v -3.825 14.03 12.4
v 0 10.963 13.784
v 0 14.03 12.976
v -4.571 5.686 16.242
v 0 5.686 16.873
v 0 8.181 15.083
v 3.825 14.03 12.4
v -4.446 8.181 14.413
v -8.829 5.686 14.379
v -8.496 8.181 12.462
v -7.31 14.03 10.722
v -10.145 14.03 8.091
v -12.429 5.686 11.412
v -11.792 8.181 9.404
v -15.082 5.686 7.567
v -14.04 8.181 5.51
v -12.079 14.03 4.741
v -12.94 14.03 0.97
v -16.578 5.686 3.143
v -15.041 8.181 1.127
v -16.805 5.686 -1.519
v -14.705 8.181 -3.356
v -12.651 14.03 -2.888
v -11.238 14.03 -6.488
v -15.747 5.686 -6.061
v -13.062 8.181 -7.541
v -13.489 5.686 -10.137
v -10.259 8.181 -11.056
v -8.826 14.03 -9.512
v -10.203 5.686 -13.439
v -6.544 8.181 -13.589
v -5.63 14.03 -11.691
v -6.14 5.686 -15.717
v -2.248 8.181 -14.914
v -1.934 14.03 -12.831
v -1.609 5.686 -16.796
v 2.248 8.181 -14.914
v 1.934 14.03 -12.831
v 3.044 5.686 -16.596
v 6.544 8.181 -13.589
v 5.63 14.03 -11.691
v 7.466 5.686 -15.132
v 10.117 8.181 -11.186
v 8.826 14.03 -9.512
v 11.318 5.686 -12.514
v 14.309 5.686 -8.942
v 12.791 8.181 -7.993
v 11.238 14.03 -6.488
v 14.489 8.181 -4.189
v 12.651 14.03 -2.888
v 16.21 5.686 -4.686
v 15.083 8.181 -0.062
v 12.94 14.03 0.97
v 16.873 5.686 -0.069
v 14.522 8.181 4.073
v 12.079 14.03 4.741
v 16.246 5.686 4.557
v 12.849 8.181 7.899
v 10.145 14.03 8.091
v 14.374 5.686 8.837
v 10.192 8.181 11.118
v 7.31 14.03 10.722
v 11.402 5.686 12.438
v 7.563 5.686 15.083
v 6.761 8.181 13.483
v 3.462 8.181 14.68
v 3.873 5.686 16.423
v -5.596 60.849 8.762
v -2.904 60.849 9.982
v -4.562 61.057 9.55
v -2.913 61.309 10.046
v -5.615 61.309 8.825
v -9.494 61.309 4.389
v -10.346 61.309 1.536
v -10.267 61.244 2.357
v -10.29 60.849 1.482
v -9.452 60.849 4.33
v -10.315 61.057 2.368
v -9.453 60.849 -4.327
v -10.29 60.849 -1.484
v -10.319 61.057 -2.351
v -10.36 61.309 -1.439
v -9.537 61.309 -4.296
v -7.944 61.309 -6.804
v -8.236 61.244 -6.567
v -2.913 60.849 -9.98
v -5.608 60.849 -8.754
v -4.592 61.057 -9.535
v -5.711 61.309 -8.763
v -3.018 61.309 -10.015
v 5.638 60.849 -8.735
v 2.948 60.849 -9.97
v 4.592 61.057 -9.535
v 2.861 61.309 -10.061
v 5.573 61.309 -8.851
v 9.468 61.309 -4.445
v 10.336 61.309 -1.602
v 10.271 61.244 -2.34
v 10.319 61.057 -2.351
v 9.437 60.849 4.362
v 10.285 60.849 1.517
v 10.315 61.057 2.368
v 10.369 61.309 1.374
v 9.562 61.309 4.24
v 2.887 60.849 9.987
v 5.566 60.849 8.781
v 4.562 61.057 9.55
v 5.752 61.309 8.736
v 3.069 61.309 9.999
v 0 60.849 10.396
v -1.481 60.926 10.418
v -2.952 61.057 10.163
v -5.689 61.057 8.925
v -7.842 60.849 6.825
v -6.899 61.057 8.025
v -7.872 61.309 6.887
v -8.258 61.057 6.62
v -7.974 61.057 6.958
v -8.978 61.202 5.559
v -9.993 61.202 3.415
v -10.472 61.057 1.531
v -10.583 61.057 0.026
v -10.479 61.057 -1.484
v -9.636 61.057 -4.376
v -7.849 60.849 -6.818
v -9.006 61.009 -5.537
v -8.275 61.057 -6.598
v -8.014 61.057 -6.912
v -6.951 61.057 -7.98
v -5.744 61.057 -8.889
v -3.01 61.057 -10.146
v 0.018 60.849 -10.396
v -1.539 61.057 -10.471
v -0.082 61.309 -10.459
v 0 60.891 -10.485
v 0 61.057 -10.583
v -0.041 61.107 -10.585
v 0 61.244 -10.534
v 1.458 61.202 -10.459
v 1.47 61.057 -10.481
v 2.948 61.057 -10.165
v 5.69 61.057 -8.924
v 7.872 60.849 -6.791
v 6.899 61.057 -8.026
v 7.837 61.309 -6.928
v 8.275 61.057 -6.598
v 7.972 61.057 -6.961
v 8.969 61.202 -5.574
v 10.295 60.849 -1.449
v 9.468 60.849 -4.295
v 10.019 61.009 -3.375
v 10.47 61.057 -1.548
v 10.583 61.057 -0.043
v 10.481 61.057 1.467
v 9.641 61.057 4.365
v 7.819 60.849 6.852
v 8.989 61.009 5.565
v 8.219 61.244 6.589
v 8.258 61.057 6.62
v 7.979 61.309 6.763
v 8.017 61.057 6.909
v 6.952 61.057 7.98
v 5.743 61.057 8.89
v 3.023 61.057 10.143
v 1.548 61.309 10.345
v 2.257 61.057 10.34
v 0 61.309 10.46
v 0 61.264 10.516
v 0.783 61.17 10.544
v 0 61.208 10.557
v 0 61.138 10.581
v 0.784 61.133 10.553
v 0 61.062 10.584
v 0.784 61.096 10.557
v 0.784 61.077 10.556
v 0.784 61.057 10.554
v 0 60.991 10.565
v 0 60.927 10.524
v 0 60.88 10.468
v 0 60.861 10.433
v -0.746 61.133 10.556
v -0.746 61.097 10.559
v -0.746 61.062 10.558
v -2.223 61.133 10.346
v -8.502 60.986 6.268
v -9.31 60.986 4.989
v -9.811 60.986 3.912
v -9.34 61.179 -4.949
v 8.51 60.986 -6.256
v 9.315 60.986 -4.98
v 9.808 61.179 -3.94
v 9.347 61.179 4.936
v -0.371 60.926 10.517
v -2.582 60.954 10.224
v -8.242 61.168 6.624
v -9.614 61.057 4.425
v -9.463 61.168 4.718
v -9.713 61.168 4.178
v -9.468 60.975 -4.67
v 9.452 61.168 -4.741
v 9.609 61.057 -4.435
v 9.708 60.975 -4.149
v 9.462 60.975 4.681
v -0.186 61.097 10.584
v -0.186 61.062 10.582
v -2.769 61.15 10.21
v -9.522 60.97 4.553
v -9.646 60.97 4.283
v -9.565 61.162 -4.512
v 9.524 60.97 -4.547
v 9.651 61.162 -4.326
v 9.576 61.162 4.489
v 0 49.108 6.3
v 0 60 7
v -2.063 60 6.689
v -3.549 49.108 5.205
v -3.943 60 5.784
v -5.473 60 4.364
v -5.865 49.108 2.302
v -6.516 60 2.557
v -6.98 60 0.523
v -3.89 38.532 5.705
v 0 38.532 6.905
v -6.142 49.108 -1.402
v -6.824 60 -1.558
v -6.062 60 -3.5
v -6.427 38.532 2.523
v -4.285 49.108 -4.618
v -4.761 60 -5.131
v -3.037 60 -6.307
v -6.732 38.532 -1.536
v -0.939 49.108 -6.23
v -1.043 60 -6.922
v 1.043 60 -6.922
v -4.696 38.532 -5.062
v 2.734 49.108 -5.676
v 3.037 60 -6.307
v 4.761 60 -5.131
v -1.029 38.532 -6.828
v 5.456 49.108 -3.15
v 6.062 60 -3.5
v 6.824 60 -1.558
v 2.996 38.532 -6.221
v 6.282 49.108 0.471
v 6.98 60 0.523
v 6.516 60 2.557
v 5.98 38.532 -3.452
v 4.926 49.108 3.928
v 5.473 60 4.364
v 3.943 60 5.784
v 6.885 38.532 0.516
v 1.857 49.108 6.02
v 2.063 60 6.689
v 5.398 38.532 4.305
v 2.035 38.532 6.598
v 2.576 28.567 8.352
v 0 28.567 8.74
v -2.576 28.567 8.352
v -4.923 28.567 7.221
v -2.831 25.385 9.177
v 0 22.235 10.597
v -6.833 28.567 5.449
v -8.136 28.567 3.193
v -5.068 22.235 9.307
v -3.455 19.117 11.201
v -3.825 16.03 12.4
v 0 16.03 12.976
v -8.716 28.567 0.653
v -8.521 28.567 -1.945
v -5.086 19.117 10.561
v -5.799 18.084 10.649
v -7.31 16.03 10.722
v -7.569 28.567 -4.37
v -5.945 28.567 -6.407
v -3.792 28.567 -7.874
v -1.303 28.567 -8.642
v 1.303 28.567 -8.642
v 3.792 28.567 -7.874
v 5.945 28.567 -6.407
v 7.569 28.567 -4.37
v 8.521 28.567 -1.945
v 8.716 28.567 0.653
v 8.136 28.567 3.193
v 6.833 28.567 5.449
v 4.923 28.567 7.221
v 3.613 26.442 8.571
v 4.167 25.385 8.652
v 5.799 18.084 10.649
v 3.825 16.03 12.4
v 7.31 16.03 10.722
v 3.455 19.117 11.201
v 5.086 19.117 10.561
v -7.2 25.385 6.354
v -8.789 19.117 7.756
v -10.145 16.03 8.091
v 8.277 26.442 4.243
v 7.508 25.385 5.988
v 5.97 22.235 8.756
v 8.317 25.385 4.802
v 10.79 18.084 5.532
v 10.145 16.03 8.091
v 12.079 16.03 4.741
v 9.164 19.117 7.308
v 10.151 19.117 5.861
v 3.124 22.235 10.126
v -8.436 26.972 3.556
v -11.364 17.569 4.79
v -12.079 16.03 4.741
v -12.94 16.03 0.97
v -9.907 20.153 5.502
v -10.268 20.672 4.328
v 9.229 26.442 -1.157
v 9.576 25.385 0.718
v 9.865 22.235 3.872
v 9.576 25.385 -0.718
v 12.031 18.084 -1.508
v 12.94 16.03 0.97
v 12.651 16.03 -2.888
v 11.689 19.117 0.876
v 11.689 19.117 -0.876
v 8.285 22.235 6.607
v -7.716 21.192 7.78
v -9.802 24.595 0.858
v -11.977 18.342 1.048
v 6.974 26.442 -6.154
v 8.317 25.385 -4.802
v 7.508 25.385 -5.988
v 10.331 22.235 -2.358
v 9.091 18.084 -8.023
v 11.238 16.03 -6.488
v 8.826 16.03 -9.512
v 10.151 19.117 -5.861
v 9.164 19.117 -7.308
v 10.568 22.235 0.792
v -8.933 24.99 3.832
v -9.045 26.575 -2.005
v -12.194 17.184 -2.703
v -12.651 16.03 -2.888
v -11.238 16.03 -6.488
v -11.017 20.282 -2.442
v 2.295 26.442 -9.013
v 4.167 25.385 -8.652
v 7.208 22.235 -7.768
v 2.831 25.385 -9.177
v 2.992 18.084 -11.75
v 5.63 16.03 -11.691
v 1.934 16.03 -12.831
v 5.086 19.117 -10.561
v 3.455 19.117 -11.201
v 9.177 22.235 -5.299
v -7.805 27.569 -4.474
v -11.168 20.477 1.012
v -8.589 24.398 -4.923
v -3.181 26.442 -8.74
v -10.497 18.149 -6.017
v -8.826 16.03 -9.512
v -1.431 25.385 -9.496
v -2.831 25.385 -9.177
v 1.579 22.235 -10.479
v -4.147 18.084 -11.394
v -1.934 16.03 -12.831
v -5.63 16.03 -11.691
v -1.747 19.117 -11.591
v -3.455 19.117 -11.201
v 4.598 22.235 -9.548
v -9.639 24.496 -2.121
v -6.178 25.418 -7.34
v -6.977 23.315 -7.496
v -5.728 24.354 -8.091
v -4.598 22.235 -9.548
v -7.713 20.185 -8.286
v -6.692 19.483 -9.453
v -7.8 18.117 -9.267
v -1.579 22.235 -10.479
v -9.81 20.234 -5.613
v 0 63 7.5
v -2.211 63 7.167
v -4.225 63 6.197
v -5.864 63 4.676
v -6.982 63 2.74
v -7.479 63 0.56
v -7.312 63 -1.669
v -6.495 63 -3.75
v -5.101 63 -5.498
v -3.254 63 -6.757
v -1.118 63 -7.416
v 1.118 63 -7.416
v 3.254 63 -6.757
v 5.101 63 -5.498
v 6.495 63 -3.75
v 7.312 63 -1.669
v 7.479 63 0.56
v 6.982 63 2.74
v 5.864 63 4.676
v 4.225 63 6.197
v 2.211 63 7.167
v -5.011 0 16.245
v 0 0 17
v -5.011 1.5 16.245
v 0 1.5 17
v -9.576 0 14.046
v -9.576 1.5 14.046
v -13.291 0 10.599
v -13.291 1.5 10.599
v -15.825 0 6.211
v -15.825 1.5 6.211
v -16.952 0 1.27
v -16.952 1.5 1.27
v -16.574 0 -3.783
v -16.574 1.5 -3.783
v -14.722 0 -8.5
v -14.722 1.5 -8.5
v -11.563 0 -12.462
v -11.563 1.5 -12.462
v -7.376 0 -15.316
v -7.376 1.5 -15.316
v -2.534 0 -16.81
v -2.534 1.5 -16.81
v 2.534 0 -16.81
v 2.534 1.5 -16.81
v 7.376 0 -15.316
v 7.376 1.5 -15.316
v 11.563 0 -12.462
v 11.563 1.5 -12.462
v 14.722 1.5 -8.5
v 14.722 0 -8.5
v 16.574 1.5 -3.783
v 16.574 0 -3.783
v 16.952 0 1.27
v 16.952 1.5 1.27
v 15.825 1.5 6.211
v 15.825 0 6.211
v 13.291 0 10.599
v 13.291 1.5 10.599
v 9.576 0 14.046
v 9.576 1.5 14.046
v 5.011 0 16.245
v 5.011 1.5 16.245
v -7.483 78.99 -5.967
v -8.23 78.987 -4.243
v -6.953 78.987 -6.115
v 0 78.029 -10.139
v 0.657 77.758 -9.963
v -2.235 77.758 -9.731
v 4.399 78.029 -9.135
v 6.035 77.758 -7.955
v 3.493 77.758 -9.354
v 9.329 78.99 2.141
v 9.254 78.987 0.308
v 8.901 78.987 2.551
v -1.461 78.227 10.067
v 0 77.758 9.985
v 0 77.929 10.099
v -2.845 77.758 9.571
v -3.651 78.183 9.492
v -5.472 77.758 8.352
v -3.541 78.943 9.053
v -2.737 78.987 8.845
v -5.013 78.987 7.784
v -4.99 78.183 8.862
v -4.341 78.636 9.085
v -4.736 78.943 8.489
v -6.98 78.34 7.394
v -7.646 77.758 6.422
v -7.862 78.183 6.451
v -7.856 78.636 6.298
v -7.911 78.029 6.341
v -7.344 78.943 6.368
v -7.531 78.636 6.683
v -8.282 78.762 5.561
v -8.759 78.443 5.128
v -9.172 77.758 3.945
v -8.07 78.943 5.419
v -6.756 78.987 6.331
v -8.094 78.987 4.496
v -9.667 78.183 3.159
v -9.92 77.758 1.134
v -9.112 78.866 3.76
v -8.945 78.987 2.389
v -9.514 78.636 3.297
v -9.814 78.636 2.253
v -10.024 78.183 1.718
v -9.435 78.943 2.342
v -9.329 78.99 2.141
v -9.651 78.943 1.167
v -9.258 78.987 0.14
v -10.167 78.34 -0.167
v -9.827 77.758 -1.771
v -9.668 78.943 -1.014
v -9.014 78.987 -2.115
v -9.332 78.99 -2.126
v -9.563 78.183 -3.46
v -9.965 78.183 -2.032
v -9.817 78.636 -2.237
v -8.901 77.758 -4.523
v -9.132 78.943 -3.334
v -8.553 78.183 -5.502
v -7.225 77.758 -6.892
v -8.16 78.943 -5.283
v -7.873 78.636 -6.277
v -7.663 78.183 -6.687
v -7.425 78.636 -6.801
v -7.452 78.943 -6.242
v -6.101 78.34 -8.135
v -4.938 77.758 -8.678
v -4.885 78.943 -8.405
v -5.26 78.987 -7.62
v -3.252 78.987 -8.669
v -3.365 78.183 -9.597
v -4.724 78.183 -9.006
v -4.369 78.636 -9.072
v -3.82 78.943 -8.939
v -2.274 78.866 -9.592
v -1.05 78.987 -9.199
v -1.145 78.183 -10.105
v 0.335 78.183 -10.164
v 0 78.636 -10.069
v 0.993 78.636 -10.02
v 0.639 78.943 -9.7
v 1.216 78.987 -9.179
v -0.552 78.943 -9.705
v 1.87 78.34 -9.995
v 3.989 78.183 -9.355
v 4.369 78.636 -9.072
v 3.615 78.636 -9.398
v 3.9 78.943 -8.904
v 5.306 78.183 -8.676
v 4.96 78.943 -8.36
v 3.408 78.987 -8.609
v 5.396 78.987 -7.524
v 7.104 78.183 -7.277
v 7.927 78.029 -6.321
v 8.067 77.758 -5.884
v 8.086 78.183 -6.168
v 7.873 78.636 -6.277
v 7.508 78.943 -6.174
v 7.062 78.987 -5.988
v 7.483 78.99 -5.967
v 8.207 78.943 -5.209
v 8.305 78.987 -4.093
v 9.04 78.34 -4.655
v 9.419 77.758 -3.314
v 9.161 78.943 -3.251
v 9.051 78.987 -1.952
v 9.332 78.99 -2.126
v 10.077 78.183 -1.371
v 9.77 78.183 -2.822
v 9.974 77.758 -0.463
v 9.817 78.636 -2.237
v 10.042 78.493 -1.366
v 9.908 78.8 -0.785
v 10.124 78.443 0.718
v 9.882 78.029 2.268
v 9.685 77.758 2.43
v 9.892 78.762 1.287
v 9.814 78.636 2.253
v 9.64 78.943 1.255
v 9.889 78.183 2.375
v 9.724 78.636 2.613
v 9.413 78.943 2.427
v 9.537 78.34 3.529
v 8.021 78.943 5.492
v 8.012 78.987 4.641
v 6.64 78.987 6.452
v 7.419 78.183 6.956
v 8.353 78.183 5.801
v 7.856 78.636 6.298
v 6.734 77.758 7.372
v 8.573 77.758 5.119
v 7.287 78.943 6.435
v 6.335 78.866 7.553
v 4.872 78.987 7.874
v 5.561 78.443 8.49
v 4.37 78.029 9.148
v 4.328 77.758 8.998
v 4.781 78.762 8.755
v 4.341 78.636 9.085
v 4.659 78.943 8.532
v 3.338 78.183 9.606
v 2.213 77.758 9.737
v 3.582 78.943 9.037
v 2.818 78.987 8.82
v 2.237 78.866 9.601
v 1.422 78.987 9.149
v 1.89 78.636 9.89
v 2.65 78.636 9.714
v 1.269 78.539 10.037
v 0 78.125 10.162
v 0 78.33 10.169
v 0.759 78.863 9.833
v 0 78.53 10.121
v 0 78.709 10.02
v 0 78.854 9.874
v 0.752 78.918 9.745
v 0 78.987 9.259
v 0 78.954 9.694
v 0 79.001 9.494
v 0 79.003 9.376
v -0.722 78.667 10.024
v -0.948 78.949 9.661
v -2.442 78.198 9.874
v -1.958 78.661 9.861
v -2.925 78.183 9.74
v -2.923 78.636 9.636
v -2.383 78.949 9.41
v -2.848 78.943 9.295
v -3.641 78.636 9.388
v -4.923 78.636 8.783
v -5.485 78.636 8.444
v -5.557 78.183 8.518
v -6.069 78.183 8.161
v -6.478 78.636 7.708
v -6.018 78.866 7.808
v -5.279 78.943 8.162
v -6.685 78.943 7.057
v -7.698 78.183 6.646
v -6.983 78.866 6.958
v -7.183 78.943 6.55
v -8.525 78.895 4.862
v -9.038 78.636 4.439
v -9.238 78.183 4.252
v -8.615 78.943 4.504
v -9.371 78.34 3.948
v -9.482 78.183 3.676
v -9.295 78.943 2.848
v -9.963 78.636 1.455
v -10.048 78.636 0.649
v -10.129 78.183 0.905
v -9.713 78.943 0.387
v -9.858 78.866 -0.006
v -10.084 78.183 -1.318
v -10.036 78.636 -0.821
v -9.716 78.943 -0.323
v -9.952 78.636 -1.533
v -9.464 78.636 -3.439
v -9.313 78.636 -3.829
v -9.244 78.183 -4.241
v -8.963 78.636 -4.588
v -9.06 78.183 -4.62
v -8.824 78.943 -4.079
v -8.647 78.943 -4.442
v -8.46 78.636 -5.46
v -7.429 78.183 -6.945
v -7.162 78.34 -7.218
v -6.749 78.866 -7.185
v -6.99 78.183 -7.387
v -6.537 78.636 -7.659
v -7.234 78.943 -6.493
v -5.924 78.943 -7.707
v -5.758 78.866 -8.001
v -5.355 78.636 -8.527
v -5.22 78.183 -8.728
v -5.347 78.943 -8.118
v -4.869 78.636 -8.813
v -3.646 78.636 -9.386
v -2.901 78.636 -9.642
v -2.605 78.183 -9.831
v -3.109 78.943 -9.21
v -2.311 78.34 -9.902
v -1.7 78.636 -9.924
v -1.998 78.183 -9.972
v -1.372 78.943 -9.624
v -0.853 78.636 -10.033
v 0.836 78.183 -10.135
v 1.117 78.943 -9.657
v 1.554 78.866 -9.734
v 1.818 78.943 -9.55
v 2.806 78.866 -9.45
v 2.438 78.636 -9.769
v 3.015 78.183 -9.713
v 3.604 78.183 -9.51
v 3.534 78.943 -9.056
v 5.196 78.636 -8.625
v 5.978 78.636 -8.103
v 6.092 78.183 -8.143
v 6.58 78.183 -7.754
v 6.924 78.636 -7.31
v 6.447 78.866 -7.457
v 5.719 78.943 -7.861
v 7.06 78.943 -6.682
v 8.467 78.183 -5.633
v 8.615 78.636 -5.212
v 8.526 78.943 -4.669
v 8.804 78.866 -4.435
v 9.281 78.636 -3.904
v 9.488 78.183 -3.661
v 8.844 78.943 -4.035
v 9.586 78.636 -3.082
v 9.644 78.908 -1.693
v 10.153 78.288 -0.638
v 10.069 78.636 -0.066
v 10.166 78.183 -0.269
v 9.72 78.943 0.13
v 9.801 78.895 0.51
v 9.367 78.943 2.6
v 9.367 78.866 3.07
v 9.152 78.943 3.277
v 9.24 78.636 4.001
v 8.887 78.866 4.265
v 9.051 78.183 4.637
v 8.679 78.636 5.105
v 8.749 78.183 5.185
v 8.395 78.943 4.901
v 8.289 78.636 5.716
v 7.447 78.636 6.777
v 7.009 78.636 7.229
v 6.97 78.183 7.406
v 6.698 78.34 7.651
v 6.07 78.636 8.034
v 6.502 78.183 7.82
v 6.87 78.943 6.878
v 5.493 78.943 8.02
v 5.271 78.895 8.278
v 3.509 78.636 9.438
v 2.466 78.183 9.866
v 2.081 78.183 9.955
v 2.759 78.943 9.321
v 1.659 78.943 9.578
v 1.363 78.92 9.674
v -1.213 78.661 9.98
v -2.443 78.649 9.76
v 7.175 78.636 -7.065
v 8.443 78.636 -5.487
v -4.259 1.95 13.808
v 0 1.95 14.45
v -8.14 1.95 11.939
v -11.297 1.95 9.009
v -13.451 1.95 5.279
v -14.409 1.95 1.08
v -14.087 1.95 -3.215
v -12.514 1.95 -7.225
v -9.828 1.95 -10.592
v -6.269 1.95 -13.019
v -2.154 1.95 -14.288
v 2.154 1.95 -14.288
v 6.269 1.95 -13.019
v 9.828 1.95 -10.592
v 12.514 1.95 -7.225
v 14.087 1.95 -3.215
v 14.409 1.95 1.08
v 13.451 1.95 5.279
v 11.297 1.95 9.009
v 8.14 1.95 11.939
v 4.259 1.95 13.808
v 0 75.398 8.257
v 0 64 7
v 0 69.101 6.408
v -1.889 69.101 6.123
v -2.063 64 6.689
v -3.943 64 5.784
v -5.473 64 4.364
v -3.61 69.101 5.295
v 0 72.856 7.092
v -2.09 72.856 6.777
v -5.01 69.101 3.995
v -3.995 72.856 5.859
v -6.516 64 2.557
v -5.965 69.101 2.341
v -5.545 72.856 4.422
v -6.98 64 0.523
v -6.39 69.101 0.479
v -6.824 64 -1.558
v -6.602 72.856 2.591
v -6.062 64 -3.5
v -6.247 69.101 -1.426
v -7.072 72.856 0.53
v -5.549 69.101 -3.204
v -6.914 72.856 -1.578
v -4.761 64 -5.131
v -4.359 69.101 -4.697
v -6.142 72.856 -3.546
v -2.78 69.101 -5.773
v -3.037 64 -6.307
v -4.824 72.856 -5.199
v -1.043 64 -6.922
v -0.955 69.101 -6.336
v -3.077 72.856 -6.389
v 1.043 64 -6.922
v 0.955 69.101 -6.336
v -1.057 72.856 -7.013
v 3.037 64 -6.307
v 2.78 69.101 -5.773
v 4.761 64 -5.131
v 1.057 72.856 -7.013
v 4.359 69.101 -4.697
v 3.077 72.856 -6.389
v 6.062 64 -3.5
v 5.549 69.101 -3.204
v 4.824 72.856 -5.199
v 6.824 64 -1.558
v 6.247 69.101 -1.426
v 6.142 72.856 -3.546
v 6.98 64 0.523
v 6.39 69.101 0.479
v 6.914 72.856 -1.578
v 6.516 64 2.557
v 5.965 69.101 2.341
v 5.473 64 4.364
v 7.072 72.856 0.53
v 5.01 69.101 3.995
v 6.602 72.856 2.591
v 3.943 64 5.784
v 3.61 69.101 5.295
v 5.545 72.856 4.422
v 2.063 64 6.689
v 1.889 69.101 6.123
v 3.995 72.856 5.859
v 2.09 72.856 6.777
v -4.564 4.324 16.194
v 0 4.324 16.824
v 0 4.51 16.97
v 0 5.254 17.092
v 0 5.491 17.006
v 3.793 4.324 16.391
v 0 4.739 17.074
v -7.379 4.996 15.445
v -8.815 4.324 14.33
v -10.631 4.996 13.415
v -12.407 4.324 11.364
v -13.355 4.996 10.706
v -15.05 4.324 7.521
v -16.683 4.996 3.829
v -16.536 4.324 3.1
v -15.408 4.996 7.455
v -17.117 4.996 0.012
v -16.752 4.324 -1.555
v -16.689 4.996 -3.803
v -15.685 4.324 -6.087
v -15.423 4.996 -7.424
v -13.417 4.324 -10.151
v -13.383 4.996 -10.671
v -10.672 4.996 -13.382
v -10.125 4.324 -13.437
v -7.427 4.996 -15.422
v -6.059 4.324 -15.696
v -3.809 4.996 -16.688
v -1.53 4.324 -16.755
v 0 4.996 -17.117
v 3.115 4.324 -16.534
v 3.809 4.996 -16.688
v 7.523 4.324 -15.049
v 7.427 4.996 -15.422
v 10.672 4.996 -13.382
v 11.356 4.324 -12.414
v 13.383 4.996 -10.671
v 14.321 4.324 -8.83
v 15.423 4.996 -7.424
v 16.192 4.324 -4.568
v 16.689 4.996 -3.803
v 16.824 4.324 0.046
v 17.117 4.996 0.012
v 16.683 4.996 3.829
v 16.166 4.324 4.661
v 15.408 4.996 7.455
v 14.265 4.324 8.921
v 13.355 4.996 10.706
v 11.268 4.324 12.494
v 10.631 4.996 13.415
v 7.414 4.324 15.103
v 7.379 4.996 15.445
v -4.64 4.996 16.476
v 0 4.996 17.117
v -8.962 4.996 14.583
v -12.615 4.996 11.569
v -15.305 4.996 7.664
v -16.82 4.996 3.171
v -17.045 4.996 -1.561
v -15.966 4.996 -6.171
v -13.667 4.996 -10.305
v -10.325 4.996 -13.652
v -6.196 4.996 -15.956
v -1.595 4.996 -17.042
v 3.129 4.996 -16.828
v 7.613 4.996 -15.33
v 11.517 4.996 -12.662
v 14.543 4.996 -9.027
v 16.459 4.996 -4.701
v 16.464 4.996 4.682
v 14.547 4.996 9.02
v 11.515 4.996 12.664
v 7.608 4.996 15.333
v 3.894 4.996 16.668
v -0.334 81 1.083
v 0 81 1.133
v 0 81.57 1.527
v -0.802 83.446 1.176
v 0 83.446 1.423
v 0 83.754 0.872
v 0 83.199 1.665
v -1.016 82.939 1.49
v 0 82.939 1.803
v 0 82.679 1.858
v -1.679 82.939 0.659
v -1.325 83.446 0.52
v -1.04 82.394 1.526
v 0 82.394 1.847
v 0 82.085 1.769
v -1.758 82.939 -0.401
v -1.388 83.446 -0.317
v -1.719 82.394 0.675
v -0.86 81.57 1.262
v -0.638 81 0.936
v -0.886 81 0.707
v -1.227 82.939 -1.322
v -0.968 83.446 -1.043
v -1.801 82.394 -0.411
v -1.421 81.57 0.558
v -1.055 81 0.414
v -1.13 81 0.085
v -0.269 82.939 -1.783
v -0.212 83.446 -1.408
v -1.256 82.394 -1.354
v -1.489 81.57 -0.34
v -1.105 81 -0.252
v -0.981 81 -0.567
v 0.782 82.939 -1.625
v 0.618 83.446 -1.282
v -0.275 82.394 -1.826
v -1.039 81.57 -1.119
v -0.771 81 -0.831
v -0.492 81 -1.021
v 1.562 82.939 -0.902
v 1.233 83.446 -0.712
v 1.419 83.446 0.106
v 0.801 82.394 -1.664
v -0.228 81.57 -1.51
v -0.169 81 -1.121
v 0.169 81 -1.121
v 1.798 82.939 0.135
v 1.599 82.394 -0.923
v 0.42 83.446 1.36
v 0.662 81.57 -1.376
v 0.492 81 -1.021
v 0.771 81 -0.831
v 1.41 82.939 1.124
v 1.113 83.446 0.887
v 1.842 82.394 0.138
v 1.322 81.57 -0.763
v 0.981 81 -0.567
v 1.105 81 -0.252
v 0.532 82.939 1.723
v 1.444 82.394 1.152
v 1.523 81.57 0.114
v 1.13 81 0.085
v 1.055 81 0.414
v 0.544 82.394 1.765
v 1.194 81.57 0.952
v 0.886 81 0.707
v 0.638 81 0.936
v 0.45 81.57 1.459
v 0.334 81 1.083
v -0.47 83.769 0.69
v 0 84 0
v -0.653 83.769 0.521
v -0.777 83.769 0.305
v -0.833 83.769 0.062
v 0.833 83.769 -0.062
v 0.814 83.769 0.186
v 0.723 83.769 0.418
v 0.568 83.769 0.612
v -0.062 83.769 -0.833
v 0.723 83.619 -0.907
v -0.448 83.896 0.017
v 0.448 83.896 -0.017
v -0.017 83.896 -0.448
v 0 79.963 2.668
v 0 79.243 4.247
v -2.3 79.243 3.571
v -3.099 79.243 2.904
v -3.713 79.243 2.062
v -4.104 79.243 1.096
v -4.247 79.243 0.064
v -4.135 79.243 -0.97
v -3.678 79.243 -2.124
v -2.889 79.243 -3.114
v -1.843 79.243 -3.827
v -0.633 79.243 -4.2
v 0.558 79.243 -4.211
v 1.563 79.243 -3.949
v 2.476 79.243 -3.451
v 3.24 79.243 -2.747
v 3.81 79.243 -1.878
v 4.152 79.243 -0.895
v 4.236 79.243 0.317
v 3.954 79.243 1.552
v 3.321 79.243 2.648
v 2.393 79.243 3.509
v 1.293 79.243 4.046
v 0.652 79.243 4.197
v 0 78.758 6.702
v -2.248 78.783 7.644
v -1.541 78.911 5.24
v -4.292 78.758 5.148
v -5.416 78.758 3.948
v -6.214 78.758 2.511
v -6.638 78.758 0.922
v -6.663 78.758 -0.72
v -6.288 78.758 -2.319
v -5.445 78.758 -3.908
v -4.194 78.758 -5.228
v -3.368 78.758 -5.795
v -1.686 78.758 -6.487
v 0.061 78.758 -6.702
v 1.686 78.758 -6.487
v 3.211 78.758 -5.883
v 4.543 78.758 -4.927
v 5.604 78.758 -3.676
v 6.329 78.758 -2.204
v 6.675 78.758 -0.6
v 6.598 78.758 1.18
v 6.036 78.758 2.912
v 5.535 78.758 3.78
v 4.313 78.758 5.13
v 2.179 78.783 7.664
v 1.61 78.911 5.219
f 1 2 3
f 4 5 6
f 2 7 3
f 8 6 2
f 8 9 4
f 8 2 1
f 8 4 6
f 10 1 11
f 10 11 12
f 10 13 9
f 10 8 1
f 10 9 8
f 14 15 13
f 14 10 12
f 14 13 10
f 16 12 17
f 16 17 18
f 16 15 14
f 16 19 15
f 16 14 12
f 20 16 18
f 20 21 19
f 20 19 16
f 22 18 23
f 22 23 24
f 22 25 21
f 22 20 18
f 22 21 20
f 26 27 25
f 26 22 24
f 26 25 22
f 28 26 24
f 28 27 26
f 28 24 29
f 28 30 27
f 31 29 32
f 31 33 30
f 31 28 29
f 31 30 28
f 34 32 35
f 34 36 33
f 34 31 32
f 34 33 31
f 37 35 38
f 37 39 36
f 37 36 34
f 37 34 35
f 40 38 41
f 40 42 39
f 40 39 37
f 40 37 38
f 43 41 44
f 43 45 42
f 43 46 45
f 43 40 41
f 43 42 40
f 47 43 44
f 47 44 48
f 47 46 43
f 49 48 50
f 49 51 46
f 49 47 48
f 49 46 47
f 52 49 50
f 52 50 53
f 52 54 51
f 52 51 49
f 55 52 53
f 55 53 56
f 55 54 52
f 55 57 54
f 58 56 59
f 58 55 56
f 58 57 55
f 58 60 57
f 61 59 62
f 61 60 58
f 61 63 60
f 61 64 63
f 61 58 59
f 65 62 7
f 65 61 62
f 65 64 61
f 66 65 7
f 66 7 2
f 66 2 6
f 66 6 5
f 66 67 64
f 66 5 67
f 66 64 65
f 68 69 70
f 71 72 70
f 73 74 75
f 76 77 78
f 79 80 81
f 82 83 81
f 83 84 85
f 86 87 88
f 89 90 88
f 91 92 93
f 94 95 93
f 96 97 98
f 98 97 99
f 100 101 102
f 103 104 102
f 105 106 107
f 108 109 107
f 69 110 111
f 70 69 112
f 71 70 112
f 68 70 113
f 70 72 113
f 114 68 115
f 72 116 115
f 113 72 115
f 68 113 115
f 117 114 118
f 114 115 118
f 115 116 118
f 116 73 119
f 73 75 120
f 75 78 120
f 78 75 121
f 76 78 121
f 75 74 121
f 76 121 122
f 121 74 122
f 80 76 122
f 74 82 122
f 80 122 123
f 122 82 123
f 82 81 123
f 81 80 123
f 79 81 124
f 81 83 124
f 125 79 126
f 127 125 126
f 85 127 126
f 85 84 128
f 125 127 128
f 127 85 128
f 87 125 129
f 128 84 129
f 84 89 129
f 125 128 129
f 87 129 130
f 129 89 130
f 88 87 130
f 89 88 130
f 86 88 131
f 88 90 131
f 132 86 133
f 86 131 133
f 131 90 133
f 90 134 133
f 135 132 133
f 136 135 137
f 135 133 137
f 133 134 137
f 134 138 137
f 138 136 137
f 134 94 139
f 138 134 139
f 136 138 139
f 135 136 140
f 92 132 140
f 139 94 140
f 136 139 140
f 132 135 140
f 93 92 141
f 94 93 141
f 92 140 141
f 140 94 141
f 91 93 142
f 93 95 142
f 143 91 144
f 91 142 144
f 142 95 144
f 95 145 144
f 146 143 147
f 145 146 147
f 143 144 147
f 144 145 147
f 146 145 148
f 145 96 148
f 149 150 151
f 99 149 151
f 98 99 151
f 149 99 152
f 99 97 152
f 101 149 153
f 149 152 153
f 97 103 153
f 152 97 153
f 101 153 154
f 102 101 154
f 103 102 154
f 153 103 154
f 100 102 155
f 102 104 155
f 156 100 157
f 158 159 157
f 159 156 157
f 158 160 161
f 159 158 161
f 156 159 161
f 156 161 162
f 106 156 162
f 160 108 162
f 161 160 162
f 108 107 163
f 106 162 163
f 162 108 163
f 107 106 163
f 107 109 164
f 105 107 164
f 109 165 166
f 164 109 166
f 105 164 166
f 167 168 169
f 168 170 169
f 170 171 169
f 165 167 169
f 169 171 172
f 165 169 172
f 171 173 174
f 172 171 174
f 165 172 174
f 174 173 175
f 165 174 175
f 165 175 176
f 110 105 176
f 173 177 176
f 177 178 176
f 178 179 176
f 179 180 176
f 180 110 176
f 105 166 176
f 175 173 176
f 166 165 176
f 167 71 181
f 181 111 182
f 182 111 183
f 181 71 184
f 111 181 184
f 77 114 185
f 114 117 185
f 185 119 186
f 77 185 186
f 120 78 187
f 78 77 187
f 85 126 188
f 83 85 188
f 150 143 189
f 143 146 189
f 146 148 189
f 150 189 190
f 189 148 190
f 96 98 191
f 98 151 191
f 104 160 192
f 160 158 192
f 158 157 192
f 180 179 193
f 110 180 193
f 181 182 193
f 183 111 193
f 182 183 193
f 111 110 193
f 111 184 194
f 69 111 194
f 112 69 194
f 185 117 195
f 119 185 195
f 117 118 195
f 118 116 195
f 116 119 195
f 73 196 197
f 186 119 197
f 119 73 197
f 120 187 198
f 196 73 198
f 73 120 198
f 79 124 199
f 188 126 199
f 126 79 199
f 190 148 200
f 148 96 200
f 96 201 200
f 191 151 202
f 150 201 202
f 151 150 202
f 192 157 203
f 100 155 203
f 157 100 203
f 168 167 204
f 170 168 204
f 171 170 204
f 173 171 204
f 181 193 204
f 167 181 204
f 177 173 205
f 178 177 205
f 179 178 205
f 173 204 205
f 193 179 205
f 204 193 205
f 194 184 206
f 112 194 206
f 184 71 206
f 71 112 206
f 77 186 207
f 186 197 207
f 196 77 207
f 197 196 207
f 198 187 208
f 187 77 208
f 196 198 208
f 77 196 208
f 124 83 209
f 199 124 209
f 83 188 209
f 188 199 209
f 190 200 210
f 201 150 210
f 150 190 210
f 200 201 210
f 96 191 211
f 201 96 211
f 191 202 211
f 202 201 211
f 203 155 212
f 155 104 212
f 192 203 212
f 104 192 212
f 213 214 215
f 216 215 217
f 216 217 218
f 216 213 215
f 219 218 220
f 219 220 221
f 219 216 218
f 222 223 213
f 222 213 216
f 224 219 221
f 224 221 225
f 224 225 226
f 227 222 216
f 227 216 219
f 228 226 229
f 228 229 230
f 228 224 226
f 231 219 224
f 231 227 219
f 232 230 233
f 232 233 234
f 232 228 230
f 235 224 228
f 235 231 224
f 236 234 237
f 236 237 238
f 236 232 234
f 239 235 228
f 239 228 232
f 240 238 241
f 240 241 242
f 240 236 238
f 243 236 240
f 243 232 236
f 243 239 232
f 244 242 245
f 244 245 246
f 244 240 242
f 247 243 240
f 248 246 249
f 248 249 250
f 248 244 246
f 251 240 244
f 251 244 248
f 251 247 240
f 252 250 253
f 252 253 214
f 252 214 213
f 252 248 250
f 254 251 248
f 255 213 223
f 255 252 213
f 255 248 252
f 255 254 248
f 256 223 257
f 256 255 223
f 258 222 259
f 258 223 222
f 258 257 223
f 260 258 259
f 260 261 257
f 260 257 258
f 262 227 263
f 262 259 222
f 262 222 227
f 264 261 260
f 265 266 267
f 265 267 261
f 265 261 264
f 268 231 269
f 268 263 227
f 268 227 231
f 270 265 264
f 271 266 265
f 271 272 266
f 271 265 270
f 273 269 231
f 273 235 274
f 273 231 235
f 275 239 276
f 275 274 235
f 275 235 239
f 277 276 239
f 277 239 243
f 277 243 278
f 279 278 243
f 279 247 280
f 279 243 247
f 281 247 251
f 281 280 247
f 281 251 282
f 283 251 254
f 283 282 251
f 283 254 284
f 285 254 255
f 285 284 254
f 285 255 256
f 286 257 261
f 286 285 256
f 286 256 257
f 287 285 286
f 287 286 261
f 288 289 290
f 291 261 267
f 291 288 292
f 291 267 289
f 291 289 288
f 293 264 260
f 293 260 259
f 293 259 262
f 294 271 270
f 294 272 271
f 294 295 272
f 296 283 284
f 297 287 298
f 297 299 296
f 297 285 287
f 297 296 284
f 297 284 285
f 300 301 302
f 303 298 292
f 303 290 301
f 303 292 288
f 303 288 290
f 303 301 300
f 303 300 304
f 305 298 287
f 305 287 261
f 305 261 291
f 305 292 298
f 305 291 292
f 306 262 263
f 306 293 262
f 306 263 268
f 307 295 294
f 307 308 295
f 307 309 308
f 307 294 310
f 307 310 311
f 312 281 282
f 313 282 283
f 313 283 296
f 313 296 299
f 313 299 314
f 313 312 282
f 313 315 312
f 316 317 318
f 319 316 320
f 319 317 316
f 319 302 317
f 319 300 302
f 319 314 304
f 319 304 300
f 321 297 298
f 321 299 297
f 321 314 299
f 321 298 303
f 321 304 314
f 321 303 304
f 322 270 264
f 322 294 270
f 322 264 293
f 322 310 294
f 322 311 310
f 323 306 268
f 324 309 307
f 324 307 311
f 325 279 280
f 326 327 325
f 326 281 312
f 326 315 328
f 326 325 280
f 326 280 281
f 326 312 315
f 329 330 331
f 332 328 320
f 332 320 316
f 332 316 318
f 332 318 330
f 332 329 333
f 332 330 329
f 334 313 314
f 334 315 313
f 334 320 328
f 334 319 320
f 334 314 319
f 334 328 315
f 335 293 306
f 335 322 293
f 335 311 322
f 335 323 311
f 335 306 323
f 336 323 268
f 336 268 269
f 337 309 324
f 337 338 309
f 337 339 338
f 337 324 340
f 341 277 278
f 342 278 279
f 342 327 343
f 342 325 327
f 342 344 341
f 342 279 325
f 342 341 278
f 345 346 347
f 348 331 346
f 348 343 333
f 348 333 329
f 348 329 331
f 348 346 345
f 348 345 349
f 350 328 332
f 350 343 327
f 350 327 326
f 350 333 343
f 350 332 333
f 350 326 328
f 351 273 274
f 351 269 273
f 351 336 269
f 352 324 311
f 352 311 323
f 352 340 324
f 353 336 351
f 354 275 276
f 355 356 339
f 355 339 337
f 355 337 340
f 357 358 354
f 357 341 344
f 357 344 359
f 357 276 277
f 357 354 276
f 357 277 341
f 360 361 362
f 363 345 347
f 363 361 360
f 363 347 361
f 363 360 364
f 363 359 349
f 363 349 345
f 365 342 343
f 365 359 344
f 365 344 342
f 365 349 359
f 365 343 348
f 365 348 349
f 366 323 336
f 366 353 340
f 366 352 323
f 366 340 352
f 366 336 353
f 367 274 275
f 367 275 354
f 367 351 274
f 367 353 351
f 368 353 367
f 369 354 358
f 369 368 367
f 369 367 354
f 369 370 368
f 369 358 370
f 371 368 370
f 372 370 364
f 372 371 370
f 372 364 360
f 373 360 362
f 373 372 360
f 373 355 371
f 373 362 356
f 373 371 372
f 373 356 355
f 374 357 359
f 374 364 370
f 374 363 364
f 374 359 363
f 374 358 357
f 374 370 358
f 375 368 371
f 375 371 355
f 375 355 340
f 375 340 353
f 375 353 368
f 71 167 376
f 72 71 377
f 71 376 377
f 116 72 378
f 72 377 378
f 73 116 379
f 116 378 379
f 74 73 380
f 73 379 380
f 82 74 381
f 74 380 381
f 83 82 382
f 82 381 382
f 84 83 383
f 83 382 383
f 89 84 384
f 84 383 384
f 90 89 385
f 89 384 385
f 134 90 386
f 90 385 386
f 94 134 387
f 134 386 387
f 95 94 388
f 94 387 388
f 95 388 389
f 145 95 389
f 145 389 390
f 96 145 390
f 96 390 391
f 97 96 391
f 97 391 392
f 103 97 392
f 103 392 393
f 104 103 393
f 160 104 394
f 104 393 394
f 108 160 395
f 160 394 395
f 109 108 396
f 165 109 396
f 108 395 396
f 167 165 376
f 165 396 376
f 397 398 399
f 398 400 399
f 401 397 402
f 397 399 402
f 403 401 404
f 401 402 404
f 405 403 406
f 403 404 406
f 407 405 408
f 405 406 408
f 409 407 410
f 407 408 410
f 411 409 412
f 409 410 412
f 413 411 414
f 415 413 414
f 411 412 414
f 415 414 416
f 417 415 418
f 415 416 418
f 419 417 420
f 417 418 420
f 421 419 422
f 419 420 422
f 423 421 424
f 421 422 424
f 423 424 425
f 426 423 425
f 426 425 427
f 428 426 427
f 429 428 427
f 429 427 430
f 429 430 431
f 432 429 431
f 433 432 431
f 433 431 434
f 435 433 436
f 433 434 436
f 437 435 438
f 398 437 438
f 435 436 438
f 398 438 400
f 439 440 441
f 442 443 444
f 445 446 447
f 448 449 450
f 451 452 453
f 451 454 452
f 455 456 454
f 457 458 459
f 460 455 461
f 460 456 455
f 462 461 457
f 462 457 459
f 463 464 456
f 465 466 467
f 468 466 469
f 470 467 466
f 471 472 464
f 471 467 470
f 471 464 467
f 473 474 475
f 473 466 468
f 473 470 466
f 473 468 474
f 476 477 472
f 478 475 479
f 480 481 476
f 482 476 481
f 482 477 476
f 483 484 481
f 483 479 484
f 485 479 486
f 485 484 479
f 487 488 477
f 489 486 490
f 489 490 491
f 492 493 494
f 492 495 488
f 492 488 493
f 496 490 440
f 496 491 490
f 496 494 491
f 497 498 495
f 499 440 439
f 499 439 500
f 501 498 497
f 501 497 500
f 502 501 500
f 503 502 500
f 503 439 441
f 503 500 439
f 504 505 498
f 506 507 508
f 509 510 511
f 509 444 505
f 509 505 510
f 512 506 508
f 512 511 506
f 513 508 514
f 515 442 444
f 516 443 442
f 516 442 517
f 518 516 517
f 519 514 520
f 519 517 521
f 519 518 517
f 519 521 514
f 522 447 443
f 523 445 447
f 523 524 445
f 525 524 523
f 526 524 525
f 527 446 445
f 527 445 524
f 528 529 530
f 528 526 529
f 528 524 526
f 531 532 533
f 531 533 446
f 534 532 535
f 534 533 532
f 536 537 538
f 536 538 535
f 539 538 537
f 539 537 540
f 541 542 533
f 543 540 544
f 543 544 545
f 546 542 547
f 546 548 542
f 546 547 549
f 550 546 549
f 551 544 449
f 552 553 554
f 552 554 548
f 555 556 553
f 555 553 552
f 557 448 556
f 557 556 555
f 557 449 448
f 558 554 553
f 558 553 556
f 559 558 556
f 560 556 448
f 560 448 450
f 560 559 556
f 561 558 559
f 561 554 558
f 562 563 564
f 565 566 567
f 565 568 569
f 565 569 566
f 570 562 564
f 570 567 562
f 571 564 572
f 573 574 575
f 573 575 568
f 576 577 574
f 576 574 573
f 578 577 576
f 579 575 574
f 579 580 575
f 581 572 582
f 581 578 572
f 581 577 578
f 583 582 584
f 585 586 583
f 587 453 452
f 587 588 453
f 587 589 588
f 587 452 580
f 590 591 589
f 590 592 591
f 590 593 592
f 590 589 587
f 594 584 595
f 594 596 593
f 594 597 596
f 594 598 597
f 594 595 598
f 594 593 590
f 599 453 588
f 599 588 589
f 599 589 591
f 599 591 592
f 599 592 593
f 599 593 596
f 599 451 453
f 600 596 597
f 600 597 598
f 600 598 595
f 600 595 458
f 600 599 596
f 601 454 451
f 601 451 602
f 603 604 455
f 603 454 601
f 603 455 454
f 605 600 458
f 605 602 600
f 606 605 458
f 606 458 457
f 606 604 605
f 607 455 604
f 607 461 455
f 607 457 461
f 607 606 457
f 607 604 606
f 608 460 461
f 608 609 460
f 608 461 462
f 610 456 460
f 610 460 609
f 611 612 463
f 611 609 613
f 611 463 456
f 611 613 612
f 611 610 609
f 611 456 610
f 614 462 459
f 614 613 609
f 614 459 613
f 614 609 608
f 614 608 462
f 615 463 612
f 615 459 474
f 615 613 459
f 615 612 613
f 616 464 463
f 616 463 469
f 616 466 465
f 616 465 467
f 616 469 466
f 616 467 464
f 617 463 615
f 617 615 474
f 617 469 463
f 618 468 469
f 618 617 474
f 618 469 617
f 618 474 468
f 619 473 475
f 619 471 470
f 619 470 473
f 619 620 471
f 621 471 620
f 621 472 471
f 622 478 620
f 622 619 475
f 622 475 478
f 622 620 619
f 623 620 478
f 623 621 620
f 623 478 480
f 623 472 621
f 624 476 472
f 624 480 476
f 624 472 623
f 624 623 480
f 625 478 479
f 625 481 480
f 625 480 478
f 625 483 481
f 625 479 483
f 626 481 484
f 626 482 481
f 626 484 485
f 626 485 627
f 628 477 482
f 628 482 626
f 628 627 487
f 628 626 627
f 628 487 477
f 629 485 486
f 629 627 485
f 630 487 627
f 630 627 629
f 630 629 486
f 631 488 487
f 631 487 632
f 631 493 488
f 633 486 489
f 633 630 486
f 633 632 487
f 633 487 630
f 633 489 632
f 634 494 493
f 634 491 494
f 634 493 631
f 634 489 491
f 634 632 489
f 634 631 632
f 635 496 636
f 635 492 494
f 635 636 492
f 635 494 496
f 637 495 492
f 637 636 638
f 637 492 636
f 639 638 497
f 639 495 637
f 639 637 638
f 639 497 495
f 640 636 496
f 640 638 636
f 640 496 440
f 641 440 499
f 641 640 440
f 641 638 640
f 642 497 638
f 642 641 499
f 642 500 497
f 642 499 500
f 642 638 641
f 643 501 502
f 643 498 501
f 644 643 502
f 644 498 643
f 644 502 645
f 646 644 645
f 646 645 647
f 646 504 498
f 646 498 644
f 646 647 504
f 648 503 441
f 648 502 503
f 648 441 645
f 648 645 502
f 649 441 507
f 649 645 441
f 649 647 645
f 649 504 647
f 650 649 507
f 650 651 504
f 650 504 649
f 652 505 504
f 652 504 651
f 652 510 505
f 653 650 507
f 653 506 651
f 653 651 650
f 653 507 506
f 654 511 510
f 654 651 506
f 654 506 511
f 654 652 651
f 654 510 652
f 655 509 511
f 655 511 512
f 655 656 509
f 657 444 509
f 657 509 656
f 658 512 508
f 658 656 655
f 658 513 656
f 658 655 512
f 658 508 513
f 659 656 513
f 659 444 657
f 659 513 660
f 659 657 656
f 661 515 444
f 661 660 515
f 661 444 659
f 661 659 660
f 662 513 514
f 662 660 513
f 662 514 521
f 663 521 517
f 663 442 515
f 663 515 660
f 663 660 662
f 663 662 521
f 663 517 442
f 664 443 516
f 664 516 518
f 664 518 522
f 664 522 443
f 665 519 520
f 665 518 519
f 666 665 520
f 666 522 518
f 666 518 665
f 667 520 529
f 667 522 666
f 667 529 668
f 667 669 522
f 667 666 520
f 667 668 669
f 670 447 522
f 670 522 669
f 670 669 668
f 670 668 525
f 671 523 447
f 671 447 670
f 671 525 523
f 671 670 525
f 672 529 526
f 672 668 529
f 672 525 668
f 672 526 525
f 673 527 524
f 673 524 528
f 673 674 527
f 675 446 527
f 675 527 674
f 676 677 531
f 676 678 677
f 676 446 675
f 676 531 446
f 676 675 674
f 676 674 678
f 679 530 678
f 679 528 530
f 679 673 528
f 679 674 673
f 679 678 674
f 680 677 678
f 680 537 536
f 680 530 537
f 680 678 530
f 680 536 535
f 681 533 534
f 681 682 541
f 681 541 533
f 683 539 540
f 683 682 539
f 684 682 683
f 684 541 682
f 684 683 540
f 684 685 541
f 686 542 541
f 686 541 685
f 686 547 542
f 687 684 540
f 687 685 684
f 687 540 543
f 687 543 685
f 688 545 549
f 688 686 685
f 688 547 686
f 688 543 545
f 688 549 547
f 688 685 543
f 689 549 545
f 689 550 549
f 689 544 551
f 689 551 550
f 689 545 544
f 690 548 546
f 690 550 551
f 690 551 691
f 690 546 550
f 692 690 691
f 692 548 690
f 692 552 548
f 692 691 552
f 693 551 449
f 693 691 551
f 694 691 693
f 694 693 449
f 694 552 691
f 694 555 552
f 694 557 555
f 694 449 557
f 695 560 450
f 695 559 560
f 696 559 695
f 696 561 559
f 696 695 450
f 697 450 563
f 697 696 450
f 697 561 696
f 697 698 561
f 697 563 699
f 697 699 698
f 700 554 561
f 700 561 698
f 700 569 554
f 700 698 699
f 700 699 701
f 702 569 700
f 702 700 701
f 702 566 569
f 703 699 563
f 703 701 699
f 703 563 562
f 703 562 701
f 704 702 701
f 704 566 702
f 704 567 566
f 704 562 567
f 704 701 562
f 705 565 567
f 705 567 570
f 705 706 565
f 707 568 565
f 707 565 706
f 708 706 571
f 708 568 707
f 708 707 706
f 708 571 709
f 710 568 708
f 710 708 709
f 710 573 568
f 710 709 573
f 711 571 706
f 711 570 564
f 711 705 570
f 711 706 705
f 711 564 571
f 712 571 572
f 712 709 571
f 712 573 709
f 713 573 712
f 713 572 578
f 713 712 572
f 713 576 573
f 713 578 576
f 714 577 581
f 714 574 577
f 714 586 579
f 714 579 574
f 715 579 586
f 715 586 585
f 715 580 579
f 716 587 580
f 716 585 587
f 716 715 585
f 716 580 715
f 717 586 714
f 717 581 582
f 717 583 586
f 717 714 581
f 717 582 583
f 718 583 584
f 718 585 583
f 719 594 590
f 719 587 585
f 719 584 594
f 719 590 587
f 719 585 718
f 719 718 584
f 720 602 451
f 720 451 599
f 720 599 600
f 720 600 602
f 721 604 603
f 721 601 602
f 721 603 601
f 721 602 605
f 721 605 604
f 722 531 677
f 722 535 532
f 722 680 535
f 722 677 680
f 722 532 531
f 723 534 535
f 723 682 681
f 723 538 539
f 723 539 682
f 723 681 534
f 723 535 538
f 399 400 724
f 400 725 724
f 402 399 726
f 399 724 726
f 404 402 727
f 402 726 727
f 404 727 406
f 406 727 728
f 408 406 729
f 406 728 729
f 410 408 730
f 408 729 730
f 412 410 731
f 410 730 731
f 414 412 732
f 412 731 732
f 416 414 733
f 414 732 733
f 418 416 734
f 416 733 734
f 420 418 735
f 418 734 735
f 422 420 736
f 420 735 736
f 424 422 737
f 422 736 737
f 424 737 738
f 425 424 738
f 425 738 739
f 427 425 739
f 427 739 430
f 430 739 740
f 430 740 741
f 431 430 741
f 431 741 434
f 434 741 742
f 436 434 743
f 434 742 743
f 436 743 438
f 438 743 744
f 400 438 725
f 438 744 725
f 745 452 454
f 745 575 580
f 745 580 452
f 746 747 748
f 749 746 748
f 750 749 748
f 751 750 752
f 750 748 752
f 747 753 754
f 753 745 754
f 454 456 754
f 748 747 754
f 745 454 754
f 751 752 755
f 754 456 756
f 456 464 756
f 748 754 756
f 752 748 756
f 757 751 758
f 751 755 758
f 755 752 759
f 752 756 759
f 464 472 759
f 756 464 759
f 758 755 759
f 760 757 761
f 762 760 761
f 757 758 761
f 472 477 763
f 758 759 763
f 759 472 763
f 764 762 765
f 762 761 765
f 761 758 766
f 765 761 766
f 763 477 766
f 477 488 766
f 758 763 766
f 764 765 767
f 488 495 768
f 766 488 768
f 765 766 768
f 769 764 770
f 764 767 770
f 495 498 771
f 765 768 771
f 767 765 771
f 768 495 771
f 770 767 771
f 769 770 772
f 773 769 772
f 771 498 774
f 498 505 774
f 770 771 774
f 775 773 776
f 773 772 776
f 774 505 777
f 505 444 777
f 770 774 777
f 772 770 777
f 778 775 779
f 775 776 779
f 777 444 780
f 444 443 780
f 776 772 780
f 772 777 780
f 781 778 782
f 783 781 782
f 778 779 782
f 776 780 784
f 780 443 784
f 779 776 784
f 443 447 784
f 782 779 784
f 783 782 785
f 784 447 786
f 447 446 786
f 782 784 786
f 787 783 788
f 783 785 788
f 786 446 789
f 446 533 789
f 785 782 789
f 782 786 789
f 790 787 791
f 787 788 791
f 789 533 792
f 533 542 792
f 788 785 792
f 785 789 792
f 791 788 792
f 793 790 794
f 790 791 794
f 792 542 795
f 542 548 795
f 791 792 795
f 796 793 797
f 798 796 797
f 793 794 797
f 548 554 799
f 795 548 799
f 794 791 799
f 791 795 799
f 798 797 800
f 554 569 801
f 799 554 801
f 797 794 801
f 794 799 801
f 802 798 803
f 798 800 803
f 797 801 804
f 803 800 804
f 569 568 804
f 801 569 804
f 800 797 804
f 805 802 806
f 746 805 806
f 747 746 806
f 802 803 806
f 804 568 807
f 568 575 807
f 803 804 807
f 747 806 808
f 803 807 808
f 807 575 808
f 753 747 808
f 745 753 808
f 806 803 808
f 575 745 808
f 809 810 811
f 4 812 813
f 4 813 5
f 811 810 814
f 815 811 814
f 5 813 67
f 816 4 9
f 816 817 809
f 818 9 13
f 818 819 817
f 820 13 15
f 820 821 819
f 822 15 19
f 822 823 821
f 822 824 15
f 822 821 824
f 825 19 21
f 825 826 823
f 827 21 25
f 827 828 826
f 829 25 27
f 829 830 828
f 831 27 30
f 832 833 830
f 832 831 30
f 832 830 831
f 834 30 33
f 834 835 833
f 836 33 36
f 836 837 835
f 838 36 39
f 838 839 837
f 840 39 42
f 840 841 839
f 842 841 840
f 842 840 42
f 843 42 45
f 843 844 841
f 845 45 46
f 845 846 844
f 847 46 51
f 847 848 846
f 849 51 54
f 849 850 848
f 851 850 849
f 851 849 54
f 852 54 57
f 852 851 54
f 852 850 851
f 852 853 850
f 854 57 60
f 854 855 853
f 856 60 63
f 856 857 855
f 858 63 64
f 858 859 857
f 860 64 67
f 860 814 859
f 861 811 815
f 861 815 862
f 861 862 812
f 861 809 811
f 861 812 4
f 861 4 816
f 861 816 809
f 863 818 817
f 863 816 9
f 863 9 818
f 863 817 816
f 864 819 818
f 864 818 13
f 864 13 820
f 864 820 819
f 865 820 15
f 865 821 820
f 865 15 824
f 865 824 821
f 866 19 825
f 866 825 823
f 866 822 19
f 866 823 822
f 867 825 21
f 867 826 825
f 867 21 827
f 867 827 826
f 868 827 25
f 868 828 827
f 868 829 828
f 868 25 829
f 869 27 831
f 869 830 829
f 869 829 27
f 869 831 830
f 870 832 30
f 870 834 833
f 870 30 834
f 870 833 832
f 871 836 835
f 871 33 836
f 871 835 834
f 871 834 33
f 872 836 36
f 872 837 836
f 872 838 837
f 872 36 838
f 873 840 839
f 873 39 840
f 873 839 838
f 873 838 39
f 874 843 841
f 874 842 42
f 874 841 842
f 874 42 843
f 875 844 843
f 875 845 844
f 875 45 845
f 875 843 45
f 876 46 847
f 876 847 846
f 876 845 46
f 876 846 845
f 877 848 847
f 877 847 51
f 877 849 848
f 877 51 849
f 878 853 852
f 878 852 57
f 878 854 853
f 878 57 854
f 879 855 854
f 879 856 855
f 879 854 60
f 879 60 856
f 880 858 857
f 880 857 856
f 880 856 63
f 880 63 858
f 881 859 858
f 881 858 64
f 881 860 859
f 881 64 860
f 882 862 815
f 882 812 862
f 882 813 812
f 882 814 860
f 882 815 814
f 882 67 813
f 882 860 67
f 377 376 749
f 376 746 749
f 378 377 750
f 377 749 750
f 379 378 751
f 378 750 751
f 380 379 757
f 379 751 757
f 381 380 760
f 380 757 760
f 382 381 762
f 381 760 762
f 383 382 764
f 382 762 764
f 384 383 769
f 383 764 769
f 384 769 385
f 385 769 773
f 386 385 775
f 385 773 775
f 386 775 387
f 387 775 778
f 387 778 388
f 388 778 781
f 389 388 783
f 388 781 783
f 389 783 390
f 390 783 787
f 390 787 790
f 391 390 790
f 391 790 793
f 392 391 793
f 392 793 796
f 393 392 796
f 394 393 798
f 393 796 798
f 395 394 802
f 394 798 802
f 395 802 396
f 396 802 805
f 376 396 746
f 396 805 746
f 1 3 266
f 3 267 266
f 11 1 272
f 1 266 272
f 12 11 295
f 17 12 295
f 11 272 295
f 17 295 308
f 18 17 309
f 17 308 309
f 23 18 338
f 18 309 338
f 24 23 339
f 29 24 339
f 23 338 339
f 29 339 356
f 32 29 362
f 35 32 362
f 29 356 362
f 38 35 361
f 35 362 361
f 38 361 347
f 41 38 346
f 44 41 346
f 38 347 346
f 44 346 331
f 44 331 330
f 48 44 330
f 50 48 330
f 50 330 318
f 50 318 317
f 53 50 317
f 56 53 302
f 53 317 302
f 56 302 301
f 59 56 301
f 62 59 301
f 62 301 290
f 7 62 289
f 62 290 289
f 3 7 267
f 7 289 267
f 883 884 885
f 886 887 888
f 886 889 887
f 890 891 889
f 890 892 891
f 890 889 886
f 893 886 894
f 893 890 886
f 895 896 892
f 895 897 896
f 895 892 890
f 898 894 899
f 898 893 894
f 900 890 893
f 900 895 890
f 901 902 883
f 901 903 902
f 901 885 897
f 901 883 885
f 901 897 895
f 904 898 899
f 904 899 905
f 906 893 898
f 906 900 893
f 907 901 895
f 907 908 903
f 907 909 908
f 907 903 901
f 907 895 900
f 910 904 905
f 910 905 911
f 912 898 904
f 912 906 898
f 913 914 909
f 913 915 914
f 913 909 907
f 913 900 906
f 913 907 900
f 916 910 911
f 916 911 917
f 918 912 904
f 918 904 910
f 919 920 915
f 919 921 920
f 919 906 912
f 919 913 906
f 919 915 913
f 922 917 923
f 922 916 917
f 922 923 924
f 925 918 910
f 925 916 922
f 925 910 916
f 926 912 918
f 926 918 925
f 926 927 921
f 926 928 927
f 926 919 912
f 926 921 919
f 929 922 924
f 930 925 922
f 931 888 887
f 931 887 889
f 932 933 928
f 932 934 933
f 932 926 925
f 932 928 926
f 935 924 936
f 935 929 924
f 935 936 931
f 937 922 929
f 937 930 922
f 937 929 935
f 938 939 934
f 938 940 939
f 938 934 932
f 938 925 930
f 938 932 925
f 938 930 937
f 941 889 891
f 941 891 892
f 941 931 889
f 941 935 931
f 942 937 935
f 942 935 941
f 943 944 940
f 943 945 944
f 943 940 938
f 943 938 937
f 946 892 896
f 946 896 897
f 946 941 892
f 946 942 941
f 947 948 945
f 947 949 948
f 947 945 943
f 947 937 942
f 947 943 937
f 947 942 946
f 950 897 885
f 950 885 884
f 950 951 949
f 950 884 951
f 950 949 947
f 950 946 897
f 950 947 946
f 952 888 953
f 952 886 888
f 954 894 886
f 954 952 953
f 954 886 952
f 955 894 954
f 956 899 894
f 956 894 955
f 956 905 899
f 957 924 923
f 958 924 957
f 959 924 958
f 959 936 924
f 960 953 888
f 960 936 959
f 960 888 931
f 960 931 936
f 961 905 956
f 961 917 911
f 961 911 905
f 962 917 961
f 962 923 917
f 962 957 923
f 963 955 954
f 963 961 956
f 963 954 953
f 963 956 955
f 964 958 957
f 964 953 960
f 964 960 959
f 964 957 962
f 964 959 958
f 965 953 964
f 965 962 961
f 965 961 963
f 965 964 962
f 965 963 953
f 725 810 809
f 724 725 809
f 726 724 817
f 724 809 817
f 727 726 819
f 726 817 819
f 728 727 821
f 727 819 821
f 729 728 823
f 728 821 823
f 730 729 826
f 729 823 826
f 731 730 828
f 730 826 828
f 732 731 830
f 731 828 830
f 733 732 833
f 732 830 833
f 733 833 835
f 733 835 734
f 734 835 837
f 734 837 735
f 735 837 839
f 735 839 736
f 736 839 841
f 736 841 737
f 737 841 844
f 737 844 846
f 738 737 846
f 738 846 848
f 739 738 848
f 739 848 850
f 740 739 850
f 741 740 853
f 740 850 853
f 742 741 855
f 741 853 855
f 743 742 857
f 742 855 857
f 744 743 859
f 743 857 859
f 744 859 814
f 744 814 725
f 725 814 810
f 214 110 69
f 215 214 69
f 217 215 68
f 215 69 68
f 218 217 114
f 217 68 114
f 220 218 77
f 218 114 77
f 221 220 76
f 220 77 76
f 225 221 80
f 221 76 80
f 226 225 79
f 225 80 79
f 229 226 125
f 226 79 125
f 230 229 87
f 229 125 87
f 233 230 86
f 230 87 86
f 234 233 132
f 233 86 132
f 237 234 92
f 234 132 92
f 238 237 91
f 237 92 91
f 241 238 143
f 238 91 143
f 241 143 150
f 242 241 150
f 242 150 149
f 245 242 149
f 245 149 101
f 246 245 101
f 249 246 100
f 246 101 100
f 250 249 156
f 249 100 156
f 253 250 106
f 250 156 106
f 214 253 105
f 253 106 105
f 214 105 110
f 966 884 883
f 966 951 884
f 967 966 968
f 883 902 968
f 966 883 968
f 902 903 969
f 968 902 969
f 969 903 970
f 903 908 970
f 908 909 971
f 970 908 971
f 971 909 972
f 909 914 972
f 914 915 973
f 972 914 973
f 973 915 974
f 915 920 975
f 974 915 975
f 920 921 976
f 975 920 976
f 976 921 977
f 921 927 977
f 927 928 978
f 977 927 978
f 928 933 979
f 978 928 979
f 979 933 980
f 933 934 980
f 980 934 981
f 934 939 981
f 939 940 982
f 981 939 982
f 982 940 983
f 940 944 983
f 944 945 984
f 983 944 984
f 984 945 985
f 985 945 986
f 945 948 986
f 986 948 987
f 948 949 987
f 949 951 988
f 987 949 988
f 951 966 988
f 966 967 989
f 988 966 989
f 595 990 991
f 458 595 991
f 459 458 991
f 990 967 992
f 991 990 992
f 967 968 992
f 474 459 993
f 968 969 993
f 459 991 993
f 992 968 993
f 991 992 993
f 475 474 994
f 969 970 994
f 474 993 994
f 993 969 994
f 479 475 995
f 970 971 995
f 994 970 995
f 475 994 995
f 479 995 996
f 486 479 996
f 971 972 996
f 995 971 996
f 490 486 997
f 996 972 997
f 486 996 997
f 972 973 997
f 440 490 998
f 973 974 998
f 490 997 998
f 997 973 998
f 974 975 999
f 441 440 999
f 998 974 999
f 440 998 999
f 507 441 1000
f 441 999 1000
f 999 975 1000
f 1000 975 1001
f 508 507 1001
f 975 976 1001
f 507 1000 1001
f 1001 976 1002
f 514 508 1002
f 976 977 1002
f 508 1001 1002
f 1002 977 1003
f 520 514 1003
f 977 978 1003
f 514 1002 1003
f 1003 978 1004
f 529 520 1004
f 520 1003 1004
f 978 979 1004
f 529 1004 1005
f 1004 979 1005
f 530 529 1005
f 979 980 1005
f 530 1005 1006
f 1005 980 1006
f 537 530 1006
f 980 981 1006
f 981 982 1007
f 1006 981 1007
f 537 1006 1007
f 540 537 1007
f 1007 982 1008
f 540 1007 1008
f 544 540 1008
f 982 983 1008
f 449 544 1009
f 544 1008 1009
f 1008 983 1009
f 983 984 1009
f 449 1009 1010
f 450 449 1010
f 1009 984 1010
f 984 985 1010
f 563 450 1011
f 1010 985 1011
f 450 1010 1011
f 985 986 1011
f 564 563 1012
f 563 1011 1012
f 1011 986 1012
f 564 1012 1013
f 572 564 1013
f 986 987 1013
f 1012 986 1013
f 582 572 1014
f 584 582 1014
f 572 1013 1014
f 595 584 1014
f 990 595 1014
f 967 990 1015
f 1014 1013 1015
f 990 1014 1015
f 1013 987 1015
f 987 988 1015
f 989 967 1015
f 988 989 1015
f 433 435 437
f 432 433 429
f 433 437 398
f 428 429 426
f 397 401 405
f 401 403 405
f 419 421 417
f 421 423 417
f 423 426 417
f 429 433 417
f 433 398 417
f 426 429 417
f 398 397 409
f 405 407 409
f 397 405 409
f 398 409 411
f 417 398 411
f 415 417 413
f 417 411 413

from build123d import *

# Parameters (mm, degrees)
FILLET1_R = 1
FILLET2_R = 0.75
FILLET3_R = 0.25


with BuildPart() as part:
    # Sketch1 → Revolve1 (revolve)
    with BuildSketch(Plane.XY, mode=Mode.PRIVATE) as revolve1_sk:
        with BuildLine():
            Line((0, 0), (17, 0))
            Line((17, 0), (17, 1.5))
            Line((17, 1.5), (14.449688693, 1.949688693))
            Line((14.449688693, 1.949688693), (17.5, 5))
            add(Edge.make_bspline(
                [(12.976411859, 14.03), (13.902117659, 8.737562454), (17.5, 5)],
                knots=[0, 0, 0, 1, 1, 1], degree=2))
            Line((12.976411859, 14.03), (12.976411859, 16.03))
            add(Edge.make_bspline(
                [(7, 60), (4.136028276, 36.595359513), (12.976411859, 16.03)],
                knots=[0, 0, 0, 1, 1, 1], degree=2))
            Line((7, 60), (11, 61))
            Line((11, 61), (7.5, 63))
            Line((7.5, 63), (7, 64))
            add(Edge.make_bspline(
                [(7, 64), (4.396490031, 74.070251116), (13, 80.5)],
                knots=[0, 0, 0, 1, 1, 1], degree=2))
            add(Edge.make_bspline(
                [(13, 80.5), (6.495844097, 76.758411128), (1.13326063, 81)],
                knots=[0, 0, 0, 1, 1, 1], degree=2))
            add(Edge.make_bspline(
                [(0, 84), (3.026484877, 83.415562524), (1.13326063, 81)],
                knots=[0, 0, 0, 1, 1, 1], degree=2))
            Line((0, 84), (0, 0))
        make_face()
    revolve(revolve1_sk.sketch.rotate(Axis((0, 84, 0), (0, -1, 0)), 90), axis=Axis((0, 84, 0), (0, -1, 0)))

    # Fillet1
    fillet1_edges = [part.edges().sort_by_distance(p)[0] for p in [
        (0, 5, -17.5),
    ]]
    fillet(fillet1_edges, radius=FILLET1_R)

    # Fillet2
    fillet2_edges = [part.edges().sort_by_distance(p)[0] for p in [
        (0, 80.5, -13),
    ]]
    fillet(fillet2_edges, radius=FILLET2_R)

    # Fillet3
    fillet3_edges = [part.edges().sort_by_distance(p)[0] for p in [
        (0, 61, -11),
    ]]
    fillet(fillet3_edges, radius=FILLET3_R)


solid = part.part
